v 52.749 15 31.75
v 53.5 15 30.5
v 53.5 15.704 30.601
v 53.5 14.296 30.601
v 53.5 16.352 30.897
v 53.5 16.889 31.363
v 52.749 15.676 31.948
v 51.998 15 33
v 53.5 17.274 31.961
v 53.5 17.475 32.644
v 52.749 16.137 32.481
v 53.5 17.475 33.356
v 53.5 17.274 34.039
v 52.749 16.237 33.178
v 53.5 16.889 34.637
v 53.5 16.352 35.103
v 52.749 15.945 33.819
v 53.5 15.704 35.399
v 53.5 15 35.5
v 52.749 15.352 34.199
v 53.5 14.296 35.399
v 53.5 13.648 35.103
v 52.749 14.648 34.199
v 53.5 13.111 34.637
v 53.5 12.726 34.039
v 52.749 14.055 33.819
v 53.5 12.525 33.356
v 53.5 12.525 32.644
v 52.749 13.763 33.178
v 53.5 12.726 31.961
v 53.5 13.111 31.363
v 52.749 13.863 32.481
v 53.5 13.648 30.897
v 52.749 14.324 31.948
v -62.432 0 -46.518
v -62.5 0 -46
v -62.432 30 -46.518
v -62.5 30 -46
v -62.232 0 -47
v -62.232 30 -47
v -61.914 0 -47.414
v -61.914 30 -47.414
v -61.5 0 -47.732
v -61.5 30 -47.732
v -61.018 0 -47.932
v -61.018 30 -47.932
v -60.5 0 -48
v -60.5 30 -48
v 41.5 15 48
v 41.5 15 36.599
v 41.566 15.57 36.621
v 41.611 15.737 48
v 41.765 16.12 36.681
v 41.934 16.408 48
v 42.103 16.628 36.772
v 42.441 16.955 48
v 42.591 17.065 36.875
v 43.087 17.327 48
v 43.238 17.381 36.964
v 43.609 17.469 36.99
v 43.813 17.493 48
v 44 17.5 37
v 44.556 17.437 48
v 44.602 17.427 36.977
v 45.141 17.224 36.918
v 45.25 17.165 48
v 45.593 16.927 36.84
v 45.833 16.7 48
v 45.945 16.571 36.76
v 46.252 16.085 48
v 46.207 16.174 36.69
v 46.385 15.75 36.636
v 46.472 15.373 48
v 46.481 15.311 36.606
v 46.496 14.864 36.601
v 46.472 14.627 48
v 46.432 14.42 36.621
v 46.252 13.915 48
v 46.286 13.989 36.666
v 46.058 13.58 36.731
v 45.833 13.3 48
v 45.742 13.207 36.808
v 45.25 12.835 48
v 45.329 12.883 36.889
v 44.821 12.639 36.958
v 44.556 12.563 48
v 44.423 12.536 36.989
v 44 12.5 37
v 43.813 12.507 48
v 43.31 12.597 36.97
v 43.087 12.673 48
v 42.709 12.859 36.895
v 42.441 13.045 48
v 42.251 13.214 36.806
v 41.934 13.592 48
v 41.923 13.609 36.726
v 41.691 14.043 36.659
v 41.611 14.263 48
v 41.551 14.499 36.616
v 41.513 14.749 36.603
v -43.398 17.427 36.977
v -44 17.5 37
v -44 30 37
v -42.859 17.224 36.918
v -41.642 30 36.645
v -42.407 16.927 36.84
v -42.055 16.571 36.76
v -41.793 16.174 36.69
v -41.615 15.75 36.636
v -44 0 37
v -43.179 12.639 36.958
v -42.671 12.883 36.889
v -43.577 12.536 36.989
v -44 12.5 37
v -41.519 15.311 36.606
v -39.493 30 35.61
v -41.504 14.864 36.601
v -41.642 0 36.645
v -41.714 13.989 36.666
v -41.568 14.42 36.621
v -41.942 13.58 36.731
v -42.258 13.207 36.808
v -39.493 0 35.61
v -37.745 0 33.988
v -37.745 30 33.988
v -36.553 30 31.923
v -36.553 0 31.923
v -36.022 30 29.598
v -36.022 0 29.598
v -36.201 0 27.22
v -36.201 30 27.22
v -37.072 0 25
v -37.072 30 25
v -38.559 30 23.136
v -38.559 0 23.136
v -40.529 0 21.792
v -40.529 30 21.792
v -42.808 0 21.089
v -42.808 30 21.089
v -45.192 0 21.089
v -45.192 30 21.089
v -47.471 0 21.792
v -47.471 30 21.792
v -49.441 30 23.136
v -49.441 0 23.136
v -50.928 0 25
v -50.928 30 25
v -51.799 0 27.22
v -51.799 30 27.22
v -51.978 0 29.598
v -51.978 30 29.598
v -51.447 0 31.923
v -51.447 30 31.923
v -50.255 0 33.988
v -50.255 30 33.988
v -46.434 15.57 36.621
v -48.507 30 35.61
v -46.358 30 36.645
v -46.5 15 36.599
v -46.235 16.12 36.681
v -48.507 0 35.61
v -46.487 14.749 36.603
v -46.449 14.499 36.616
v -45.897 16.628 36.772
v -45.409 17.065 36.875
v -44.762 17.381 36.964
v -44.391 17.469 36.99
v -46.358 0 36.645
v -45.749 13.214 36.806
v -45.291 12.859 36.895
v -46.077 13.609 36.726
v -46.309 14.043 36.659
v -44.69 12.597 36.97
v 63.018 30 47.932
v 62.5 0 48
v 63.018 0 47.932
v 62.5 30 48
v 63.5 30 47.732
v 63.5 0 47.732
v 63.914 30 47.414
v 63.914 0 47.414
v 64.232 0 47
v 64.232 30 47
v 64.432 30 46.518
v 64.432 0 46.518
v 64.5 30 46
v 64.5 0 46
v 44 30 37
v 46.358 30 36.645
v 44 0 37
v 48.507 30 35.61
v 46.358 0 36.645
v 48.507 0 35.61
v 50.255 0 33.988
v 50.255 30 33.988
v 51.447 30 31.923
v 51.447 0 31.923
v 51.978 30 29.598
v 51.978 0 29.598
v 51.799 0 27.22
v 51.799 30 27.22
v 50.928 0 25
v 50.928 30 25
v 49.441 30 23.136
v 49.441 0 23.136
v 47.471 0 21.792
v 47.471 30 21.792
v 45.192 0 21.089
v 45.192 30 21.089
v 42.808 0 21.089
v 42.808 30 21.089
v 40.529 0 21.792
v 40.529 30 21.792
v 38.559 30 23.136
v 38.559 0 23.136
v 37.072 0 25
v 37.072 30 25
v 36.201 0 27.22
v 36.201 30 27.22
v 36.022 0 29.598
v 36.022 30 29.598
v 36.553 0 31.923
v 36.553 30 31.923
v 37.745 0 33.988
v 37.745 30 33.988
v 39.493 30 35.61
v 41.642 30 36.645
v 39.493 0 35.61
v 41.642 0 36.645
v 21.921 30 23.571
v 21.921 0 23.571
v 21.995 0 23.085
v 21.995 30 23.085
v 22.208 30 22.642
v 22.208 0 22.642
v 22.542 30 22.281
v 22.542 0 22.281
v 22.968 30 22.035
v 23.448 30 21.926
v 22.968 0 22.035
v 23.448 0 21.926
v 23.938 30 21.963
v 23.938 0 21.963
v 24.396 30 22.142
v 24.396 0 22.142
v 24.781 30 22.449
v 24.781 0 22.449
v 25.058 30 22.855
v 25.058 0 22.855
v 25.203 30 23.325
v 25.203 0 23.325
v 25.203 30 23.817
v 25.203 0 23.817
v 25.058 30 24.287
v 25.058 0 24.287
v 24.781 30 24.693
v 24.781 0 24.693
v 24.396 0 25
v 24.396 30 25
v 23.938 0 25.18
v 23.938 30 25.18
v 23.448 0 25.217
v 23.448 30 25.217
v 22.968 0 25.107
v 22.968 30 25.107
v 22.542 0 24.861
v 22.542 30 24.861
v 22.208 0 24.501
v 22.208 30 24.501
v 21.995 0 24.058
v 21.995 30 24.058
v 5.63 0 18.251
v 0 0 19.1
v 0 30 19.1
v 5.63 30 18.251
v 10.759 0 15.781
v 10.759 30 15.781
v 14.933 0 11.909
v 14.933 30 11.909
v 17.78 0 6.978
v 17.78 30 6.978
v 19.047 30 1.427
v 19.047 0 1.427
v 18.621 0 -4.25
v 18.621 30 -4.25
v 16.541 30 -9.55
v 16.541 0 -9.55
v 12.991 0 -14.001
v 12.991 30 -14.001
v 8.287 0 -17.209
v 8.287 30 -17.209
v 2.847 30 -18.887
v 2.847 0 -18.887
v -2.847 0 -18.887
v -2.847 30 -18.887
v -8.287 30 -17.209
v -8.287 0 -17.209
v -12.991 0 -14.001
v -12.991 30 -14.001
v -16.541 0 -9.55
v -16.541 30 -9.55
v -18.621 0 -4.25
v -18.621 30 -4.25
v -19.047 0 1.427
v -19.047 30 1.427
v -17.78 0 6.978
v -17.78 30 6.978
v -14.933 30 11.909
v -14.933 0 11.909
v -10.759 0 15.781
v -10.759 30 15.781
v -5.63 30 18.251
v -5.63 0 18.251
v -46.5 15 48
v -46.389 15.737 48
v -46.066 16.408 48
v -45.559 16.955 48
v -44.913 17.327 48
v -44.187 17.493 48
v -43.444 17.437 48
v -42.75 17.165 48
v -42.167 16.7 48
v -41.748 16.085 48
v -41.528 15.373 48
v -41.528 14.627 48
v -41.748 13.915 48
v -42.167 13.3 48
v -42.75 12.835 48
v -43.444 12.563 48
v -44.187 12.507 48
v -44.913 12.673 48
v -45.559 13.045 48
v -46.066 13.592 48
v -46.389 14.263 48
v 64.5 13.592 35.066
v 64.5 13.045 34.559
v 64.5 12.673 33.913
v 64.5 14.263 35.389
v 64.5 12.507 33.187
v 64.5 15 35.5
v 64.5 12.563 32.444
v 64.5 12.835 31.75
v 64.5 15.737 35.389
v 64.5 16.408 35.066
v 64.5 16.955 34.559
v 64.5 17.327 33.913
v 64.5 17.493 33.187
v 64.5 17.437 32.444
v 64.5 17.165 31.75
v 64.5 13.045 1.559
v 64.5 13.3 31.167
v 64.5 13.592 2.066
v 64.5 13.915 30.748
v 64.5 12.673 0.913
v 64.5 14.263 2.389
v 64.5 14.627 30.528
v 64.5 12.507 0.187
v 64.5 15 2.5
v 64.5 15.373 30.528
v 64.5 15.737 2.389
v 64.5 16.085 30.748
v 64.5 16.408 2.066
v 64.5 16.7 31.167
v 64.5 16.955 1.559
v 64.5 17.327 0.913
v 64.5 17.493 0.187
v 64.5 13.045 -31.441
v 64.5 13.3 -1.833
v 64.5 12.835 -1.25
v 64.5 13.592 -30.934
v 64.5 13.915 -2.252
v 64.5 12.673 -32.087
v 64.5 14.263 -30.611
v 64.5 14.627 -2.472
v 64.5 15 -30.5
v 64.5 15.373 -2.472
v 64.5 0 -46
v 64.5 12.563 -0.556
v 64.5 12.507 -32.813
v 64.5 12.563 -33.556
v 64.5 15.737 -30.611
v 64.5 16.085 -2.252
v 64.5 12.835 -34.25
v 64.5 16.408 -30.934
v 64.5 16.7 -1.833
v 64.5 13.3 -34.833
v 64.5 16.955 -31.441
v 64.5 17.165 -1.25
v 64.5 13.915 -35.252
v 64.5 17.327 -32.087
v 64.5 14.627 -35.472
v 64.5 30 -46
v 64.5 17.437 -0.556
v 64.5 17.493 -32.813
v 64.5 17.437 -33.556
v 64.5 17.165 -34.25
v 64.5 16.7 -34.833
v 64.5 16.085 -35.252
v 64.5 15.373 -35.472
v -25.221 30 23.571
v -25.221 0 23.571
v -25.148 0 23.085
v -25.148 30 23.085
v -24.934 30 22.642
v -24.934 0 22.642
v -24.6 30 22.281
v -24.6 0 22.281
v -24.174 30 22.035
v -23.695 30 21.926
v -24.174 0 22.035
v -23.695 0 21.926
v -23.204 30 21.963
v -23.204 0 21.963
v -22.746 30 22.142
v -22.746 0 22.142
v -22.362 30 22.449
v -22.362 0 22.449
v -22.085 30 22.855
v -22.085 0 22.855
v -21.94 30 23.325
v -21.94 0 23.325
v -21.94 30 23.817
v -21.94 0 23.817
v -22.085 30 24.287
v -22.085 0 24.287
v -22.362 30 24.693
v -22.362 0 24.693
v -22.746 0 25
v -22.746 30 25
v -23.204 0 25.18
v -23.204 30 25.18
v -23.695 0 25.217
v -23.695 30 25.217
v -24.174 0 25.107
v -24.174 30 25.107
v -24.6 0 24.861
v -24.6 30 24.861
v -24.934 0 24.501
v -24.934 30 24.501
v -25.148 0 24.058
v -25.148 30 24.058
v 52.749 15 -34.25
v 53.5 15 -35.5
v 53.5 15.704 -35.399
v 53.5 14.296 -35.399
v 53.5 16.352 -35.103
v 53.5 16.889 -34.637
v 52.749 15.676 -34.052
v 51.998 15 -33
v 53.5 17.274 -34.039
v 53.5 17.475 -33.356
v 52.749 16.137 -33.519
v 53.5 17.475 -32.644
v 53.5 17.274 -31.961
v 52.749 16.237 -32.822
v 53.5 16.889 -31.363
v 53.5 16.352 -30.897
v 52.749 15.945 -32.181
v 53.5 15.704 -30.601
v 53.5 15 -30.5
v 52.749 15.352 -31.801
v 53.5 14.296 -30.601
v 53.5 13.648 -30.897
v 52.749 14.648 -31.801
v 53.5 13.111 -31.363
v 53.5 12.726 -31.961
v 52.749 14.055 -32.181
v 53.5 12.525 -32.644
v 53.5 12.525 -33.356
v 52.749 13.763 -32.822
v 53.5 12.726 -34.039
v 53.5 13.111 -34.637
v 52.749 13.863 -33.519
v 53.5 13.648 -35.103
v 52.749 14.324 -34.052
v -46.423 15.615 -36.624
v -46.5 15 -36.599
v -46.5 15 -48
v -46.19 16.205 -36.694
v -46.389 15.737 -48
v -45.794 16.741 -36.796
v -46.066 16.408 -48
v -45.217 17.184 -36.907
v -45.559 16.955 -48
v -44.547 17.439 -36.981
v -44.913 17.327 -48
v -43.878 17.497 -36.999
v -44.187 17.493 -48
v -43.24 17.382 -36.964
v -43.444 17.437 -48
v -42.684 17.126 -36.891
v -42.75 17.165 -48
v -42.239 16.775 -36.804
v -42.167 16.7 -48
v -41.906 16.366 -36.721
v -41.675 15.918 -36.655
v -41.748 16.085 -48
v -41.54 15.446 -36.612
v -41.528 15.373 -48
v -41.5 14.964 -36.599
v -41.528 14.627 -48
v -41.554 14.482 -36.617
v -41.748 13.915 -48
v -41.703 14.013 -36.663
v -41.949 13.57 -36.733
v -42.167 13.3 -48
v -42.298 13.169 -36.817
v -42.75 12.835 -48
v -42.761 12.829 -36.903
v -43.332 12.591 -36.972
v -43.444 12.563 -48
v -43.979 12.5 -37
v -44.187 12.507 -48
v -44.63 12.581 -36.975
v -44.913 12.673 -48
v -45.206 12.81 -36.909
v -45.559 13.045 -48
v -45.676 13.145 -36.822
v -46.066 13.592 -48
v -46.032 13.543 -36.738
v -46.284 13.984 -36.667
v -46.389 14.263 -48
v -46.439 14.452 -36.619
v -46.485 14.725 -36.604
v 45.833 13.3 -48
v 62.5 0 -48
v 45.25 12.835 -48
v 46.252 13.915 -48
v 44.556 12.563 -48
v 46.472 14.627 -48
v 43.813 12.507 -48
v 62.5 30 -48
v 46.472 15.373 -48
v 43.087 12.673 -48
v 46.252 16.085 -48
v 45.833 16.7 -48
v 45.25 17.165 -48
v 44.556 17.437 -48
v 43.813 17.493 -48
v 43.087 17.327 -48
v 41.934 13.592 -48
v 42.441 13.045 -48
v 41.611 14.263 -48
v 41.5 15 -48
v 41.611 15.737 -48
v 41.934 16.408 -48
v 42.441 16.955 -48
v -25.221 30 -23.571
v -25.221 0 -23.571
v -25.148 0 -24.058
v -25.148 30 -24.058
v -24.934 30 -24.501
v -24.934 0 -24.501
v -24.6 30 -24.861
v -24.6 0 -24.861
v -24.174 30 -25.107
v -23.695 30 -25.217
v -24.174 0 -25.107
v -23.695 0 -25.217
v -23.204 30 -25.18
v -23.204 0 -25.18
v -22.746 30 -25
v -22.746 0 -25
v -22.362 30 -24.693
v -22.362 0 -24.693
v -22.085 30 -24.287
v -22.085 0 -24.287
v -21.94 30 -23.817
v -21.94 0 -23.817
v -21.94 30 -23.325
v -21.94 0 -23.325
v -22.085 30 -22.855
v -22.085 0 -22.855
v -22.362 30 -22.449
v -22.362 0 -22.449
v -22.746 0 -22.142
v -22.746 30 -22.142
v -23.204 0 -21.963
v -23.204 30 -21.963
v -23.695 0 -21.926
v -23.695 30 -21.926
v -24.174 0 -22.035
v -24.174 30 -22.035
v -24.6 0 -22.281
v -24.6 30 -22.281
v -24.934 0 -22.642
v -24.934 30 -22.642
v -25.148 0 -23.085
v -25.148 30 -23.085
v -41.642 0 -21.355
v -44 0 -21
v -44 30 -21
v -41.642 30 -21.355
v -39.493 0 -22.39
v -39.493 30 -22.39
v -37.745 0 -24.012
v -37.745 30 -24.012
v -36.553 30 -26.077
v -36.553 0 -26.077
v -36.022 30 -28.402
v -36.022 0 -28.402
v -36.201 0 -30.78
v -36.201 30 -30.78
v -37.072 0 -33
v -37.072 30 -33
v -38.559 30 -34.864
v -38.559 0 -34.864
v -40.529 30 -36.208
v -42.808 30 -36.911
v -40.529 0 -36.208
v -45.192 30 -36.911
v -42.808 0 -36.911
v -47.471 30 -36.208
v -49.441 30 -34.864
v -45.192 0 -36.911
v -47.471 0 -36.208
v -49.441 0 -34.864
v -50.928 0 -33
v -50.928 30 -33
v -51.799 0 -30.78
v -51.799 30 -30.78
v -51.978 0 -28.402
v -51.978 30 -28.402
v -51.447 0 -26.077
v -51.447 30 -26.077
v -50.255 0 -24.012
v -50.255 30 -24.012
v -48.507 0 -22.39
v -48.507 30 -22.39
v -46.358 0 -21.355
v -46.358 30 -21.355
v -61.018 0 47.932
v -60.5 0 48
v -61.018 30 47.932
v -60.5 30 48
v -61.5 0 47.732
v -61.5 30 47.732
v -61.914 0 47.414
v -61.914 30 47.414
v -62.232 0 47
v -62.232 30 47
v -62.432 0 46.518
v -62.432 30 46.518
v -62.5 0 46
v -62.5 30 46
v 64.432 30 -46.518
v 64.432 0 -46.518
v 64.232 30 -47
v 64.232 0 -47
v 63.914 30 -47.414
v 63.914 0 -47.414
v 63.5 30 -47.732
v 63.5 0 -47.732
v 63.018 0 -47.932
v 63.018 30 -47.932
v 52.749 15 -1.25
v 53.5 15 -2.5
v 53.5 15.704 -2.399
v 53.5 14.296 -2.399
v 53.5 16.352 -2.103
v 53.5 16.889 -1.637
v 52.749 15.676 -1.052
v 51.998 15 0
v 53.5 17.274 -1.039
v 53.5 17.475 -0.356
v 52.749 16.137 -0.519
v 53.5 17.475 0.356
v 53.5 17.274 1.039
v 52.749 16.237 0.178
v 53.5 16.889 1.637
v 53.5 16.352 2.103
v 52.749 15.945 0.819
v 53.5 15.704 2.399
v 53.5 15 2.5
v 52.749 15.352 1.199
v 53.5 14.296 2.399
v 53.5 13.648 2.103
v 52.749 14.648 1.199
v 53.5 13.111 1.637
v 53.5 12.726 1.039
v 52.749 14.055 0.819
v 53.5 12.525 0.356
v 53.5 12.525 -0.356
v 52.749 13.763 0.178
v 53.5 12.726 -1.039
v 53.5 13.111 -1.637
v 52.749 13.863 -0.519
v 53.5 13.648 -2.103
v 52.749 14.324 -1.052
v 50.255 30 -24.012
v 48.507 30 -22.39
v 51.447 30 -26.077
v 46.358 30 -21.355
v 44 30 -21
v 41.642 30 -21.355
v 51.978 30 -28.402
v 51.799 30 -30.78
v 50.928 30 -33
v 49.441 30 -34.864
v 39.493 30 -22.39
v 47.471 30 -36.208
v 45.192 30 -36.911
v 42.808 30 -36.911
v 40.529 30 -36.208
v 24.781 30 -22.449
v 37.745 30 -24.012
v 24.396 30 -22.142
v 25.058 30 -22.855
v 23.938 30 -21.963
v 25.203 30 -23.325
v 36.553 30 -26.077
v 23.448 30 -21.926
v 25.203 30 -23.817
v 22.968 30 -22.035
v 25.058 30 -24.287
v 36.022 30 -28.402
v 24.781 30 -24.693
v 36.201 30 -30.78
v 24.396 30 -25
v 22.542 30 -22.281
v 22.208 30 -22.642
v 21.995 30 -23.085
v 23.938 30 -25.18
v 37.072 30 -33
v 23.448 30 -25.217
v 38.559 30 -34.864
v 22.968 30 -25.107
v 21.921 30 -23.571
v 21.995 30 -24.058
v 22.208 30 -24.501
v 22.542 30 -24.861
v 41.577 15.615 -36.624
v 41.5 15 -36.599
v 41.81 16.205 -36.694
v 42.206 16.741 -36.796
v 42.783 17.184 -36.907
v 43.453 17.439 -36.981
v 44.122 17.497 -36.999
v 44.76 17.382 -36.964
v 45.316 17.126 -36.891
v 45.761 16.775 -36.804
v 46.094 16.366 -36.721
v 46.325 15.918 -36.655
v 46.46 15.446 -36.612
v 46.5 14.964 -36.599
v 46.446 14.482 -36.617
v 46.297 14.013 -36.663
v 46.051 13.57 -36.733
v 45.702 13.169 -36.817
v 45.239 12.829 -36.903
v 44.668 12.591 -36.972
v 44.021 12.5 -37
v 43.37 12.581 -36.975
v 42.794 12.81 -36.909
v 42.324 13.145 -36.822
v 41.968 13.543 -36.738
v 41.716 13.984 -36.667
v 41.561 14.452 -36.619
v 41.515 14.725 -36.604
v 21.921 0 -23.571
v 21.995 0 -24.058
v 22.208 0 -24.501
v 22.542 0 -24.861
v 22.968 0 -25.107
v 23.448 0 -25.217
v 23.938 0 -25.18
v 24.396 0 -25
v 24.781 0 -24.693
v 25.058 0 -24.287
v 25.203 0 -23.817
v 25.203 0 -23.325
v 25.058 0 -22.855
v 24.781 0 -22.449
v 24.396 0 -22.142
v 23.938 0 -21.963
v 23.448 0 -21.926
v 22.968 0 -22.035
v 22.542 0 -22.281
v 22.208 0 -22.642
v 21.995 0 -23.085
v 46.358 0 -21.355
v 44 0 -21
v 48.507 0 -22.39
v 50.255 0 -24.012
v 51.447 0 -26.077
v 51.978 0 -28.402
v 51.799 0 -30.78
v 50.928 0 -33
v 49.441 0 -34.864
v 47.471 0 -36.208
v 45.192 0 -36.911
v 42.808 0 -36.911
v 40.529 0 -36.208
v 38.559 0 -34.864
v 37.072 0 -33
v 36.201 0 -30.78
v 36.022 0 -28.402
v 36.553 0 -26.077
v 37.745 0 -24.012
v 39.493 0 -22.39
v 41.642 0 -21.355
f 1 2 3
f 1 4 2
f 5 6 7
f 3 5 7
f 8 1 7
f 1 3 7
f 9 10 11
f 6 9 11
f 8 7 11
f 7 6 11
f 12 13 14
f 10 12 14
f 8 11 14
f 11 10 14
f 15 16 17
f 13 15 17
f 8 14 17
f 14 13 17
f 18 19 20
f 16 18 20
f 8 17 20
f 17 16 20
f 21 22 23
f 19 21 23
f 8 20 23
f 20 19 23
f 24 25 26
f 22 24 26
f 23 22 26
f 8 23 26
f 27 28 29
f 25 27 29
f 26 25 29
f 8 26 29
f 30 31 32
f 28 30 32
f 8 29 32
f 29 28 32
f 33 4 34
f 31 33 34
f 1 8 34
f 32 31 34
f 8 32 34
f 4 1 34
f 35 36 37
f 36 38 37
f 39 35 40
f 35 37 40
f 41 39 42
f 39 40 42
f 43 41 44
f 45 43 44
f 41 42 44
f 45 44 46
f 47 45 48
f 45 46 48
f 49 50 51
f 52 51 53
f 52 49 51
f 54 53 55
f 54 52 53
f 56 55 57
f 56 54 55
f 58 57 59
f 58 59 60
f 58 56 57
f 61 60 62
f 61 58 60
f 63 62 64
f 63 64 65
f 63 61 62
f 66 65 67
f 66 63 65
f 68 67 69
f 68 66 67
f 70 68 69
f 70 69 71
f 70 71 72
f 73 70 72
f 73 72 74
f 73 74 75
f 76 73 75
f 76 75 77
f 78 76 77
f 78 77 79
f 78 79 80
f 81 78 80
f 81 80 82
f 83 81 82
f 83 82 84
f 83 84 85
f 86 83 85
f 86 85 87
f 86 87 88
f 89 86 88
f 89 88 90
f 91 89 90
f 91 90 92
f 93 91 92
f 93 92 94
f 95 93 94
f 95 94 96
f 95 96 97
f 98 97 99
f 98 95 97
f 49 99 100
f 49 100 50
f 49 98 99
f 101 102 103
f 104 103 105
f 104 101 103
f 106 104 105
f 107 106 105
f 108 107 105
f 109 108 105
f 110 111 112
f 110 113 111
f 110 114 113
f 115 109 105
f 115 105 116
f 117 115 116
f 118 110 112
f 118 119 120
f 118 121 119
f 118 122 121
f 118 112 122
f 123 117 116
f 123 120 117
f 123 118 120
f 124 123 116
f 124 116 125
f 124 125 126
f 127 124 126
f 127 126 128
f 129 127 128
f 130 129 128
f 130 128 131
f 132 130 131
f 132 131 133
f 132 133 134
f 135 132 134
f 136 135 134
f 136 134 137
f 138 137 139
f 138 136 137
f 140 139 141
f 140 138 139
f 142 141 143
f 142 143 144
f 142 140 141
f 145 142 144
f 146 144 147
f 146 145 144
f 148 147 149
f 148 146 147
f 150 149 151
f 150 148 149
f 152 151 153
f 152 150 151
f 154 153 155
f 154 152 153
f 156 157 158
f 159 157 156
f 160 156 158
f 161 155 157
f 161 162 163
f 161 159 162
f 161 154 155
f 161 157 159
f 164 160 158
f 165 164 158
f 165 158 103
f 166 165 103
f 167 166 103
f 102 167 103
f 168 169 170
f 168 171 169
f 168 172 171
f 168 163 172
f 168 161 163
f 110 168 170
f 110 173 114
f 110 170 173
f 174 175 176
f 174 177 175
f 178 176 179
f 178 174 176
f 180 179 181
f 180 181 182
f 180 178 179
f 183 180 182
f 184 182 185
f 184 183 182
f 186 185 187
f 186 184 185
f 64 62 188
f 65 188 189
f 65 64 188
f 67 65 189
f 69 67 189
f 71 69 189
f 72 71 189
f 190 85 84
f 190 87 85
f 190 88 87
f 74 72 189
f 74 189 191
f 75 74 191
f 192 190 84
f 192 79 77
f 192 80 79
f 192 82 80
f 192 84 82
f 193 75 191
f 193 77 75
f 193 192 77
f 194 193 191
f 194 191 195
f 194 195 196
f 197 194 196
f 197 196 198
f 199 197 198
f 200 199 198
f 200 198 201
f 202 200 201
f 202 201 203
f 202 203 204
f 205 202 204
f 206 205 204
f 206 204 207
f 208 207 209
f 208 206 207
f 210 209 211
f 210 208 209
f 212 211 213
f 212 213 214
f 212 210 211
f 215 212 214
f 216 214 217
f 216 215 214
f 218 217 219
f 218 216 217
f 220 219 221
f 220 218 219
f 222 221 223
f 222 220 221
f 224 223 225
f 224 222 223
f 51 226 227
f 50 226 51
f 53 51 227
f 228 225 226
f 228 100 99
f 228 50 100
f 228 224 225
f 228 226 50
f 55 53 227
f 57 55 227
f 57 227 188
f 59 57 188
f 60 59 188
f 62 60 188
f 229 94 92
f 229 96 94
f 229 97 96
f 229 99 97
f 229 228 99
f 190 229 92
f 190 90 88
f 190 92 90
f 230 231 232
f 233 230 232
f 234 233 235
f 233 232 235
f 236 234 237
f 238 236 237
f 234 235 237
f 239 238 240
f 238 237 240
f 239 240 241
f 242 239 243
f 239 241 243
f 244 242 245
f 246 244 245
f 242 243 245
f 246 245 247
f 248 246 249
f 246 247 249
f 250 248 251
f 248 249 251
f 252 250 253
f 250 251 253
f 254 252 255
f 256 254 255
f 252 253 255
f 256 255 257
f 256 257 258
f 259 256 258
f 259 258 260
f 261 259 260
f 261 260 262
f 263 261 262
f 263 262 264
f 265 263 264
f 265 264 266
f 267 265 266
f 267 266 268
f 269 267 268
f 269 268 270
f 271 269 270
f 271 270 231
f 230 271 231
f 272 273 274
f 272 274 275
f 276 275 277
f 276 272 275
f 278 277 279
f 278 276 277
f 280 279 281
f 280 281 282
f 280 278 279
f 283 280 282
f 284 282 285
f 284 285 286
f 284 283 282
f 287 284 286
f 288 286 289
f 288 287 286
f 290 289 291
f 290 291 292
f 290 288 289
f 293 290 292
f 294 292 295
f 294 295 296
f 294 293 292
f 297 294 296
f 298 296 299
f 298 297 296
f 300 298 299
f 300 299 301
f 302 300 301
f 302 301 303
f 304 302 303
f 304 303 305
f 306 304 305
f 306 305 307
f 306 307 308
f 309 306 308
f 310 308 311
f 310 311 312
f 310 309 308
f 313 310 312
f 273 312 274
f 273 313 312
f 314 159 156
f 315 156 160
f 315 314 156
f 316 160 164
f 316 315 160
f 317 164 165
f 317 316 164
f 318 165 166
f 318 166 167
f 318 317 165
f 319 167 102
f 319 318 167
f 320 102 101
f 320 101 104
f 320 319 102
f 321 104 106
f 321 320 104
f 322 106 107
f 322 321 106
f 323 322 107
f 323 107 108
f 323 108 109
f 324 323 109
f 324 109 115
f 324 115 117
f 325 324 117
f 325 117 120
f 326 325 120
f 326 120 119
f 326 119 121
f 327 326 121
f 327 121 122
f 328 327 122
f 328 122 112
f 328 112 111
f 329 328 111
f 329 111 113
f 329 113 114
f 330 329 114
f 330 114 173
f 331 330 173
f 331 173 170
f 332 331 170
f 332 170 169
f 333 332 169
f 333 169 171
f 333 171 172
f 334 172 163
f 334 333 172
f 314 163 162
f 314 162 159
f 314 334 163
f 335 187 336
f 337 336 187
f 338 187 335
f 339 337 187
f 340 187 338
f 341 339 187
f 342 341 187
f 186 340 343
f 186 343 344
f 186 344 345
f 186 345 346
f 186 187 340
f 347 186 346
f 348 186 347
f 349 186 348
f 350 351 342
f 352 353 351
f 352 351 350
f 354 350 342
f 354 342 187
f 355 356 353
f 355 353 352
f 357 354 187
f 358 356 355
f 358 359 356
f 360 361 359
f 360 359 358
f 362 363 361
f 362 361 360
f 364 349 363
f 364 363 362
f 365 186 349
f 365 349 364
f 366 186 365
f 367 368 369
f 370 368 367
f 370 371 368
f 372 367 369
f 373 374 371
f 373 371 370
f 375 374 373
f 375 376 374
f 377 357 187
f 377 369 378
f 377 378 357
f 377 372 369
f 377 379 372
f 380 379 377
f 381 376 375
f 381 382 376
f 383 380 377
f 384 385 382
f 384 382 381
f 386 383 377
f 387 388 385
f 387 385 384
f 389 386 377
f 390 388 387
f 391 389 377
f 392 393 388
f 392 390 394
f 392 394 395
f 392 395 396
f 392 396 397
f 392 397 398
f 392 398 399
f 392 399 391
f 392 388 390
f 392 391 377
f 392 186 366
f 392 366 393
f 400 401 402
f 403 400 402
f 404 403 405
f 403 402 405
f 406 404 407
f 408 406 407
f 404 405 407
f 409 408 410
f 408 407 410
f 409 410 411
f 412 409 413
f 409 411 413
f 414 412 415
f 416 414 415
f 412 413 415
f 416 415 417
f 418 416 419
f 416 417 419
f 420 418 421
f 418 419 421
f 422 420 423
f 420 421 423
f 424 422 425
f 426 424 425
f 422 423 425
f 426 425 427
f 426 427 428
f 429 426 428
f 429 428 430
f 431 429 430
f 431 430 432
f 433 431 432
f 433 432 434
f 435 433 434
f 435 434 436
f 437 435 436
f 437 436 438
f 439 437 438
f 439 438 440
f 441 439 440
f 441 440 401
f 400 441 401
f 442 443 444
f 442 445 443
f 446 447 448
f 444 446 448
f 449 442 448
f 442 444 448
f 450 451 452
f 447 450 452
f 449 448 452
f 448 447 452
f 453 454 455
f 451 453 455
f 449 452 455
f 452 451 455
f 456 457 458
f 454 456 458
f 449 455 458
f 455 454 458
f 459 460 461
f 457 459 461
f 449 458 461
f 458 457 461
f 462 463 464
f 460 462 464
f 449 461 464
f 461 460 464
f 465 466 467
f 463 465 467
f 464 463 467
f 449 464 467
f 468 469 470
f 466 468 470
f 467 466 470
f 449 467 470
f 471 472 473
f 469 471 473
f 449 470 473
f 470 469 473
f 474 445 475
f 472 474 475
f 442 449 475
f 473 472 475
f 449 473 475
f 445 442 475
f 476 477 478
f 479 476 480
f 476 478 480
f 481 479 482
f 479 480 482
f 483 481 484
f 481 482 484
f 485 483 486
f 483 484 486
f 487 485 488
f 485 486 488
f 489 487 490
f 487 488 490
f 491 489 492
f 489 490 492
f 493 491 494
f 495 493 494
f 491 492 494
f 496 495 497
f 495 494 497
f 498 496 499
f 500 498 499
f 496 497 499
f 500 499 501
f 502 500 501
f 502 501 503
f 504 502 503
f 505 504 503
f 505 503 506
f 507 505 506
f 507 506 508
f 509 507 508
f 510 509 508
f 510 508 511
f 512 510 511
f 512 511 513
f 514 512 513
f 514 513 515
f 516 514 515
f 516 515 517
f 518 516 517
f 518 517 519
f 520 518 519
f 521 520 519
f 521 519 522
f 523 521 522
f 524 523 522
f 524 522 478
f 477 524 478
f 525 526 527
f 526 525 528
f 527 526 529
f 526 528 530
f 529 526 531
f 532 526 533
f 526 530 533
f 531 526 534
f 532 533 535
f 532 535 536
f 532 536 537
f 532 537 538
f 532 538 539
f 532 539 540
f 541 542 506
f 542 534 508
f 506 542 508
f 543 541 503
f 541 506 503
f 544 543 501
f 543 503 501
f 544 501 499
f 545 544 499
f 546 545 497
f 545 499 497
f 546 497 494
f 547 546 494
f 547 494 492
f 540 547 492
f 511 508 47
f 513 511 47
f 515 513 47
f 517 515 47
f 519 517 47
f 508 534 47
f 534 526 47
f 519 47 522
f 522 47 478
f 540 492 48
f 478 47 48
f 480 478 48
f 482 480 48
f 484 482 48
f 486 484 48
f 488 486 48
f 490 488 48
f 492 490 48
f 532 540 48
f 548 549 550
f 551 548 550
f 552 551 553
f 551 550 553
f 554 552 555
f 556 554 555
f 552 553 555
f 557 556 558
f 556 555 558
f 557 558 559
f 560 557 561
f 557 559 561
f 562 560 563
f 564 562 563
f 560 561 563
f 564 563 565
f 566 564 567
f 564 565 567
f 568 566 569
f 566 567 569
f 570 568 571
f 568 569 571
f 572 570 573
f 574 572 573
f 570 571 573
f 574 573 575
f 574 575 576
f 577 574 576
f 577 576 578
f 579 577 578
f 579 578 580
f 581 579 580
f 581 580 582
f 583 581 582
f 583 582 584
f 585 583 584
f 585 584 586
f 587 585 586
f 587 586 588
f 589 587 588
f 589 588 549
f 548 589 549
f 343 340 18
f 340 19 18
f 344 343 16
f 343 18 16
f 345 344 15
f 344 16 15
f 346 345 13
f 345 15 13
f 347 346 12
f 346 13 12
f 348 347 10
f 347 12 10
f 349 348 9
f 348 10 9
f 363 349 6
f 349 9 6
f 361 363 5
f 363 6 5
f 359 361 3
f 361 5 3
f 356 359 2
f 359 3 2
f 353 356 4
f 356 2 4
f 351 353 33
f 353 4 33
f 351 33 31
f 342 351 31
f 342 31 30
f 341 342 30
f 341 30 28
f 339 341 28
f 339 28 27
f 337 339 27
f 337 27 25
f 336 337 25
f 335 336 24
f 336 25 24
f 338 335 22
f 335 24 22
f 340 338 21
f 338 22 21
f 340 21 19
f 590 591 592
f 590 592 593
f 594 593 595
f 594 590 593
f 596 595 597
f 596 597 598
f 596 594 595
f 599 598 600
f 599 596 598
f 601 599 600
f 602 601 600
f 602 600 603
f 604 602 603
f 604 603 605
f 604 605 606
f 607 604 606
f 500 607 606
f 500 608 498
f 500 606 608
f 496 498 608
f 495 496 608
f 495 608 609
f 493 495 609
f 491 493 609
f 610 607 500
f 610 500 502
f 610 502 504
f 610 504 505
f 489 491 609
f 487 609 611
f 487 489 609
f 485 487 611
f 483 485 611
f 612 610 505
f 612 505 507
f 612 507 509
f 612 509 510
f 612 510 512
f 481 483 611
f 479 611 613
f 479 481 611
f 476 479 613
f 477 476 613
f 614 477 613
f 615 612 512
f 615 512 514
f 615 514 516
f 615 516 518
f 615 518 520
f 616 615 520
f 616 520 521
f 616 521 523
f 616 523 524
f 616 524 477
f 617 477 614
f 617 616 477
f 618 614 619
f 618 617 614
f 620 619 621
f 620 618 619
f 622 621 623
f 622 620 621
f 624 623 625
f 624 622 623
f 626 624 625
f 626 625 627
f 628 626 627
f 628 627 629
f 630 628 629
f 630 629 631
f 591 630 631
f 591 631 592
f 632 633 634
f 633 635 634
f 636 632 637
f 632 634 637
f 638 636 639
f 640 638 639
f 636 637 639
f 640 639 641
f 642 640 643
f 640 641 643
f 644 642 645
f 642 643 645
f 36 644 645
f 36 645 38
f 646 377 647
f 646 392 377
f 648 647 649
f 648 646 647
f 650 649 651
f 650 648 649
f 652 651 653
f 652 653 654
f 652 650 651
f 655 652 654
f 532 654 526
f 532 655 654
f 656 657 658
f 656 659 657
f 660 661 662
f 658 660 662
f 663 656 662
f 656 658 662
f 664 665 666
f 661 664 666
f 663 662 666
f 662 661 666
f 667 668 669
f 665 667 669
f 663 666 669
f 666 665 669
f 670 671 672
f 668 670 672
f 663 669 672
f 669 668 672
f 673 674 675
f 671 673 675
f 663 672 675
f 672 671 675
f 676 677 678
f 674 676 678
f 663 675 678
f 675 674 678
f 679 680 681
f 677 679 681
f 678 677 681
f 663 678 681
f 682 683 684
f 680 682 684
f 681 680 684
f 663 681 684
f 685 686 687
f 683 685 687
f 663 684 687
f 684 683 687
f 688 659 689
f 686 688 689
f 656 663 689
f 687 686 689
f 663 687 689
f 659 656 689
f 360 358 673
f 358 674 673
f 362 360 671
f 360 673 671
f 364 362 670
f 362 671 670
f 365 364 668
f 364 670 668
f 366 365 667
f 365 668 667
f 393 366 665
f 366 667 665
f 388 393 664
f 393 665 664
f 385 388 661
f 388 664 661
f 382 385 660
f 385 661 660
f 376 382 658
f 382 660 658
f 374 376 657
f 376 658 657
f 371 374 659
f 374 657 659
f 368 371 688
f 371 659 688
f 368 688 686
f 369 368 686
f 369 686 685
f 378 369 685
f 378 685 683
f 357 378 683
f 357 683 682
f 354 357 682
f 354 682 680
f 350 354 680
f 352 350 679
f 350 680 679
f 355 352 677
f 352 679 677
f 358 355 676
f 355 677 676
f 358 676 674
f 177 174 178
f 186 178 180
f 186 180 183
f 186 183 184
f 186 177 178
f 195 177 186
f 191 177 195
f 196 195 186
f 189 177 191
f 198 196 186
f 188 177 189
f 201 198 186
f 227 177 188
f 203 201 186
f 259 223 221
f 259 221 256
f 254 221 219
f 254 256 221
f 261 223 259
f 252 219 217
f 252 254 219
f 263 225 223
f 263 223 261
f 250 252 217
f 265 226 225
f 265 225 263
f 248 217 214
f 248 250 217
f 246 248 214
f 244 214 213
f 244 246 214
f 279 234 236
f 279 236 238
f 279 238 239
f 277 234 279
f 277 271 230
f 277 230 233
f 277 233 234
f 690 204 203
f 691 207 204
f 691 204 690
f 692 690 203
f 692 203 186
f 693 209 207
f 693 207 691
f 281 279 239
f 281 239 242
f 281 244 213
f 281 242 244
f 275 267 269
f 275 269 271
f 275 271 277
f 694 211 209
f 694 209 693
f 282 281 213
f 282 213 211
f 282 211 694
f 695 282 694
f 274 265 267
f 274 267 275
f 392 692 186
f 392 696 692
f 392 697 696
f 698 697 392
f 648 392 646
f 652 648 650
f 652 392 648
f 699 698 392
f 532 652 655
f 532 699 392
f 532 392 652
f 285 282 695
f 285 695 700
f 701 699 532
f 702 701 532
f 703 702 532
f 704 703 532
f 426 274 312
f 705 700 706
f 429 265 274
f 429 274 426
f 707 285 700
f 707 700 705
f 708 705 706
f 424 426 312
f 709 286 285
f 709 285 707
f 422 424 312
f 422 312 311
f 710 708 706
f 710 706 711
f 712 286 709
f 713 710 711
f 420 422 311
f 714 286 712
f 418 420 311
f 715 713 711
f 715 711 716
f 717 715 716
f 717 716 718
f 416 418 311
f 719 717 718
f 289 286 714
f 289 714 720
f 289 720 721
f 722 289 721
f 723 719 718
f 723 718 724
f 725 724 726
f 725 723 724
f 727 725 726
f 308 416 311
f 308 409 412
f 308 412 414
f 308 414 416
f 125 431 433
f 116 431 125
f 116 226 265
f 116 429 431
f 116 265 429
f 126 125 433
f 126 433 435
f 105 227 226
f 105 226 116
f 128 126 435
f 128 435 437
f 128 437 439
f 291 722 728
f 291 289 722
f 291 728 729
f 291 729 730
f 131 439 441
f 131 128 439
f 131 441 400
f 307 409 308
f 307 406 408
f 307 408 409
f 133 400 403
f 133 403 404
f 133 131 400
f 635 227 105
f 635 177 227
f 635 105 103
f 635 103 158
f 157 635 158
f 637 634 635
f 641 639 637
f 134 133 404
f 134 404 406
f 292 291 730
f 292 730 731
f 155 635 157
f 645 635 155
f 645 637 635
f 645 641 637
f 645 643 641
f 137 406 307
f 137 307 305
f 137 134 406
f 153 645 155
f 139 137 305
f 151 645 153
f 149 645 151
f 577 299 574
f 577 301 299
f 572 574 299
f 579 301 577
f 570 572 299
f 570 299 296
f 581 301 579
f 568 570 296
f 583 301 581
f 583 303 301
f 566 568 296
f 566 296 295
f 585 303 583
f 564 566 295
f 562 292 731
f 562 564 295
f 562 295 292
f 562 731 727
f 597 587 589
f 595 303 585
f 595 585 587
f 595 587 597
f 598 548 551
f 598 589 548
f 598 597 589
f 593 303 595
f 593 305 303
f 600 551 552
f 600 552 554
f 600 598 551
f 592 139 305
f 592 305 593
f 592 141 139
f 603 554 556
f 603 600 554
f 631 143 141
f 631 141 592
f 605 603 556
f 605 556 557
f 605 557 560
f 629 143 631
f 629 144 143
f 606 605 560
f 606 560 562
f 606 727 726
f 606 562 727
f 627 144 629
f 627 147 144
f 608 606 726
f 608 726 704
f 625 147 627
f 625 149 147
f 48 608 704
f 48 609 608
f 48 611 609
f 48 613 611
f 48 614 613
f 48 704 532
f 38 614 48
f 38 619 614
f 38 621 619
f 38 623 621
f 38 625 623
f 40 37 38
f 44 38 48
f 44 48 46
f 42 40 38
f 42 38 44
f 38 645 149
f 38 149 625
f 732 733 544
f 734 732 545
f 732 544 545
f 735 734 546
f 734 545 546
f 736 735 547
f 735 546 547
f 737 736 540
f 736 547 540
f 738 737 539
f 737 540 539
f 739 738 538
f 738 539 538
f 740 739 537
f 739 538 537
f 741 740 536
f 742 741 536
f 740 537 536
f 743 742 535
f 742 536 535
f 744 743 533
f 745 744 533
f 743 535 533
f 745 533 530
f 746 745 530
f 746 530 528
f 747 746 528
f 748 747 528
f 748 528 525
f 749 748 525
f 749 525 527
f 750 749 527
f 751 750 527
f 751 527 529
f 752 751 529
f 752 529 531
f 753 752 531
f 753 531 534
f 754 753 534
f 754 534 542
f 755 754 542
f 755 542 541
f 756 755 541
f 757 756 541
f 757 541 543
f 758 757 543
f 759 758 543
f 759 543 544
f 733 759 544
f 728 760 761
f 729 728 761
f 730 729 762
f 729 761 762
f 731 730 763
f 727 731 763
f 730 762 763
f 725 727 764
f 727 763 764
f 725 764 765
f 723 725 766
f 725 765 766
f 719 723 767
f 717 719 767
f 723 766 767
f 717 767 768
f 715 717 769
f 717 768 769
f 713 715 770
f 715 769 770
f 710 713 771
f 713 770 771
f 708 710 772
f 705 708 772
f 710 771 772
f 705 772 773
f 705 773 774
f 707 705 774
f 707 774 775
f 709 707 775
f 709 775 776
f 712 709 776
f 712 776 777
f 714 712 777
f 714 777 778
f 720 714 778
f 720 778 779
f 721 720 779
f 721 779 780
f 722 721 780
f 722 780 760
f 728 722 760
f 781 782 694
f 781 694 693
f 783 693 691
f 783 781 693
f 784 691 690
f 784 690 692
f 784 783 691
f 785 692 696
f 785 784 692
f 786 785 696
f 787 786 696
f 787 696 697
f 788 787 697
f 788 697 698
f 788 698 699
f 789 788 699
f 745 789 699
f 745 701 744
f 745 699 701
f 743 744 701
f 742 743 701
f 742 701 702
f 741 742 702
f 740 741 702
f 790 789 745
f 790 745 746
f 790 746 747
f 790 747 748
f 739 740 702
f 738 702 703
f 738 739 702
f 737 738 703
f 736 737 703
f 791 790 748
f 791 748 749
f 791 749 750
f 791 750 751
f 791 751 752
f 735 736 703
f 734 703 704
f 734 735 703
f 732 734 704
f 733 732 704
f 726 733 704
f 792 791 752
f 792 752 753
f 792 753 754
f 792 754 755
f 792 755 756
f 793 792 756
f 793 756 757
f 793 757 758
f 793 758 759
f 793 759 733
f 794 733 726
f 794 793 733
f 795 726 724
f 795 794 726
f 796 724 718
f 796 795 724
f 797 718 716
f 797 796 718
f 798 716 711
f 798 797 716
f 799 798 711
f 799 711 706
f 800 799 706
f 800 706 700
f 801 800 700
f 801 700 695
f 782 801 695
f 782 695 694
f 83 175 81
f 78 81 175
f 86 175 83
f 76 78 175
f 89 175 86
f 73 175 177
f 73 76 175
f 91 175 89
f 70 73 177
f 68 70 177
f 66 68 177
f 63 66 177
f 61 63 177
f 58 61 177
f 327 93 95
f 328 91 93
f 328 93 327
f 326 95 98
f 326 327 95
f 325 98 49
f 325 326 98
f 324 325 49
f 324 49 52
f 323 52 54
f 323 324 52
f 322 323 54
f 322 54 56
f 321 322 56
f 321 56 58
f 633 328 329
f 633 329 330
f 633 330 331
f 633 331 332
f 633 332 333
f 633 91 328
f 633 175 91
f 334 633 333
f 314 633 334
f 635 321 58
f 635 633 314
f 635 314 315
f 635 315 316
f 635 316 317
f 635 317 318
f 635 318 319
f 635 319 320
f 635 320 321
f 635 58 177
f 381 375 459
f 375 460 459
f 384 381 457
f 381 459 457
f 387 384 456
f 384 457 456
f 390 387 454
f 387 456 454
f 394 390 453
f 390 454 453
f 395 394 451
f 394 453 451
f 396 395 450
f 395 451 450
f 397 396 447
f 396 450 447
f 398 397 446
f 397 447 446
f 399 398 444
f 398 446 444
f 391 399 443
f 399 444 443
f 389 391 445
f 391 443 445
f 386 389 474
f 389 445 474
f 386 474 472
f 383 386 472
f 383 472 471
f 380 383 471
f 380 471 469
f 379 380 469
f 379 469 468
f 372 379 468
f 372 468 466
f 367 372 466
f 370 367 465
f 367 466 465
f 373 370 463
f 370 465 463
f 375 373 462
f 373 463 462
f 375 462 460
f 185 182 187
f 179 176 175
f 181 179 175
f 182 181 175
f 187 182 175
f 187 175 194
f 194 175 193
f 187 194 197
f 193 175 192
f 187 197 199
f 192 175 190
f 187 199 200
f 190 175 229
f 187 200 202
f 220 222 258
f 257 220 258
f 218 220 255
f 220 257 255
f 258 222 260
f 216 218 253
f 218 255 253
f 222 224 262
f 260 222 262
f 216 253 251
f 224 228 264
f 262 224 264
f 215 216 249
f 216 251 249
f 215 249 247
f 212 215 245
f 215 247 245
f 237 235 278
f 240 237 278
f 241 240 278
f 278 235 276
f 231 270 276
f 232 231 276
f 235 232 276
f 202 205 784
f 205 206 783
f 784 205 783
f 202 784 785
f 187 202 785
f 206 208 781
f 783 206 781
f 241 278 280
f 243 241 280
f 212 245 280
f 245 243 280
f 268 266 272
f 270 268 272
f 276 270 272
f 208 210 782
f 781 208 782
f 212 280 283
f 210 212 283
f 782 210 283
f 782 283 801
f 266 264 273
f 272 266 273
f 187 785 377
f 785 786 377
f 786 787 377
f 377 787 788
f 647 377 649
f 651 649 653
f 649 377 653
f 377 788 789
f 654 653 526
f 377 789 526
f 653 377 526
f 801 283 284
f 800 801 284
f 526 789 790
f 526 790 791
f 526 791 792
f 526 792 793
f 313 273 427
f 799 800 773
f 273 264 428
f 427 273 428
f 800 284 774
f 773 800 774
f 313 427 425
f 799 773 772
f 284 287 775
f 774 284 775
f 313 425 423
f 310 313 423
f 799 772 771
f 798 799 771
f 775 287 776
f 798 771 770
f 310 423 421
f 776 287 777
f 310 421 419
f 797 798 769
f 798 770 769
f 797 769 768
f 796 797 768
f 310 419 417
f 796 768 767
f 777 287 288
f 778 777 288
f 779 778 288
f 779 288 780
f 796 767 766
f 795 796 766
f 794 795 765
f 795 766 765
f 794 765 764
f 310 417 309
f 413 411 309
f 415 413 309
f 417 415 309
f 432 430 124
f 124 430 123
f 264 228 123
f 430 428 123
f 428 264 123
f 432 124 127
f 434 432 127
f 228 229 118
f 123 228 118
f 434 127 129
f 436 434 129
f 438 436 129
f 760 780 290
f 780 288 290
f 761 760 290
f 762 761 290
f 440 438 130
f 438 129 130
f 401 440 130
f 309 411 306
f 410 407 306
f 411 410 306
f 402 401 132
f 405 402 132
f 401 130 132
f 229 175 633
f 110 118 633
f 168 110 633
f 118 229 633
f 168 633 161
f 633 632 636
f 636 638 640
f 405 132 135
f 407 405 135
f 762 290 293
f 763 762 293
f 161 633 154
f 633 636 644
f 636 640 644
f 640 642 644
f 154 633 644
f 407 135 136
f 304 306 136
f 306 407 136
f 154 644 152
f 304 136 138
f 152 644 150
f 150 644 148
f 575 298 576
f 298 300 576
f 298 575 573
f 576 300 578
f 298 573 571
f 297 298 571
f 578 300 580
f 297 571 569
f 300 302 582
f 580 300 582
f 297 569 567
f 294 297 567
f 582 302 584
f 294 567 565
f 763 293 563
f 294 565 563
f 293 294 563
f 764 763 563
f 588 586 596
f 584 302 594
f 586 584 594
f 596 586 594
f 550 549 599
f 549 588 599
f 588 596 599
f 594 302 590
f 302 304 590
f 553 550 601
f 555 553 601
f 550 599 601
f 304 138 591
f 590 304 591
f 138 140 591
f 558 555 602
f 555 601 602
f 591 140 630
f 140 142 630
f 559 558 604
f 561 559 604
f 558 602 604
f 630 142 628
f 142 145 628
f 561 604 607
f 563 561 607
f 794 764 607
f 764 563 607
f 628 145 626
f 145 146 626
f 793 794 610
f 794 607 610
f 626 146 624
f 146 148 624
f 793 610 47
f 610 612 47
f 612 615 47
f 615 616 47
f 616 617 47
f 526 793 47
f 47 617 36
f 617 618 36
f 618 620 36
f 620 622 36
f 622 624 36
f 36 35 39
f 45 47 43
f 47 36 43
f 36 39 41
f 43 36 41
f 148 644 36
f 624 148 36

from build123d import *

# Parameters (mm, degrees)
SKETCH2_W                  = 125
SKETCH2_H                  = 96
SKETCH2_R                  = 8
SKETCH2_R_2                = 19.1
BOSS_EXTRUDE1_DEPTH        = 30
M4X0_7_TAPPED_HOLE1_D      = 3.3
SKETCH10_W                 = 96
SKETCH10_H                 = 30
BOSS_EXTRUDE3_DEPTH        = 2
M6X1_0_TAPPED_HOLE1_D      = 5
M6X1_0_TAPPED_HOLE1_DEPTH  = 11
M6X1_0_TAPPED_HOLE1_TIP    = 1.502151548
M6X1_0_TAPPED_HOLE3_REACH  = 121.483
M6X1_0_TAPPED_HOLE3_BORE_R = 2.5
FILLET1_R                  = 2


with BuildPart() as part:
    # Sketch2 → Boss-Extrude1 (new body)
    with BuildSketch(Plane(origin=(0, 0, 0), x_dir=(1, 0, 0), z_dir=(0, 1, 0))):
        Rectangle(SKETCH2_W, SKETCH2_H)
        with Locations(Location((-44, 29, 0), (0, 0, 270))):
            Circle(SKETCH2_R, mode=Mode.SUBTRACT)
        with Locations(Location((-44, -29, 0), (0, 0, 270))):
            Circle(SKETCH2_R, mode=Mode.SUBTRACT)
        with Locations(Location((44, -29, 0), (0, 0, 270))):
            Circle(SKETCH2_R, mode=Mode.SUBTRACT)
        with Locations(Location((44, 29, 0), (0, 0, 270))):
            Circle(SKETCH2_R, mode=Mode.SUBTRACT)
        with Locations(Location((0, 0, 0), (0, 0, 270))):
            Circle(SKETCH2_R_2, mode=Mode.SUBTRACT)
    extrude(amount=BOSS_EXTRUDE1_DEPTH)

    # M4x0.7 Tapped Hole1 (through all)
    with Locations(Plane(origin=(0, 30, 0), x_dir=(1, 0, 0), z_dir=(0, 1, 0))):
        with Locations((-23.5712, 23.5712), (23.5712, 23.5712), (23.5712, -23.5712), (-23.5712, -23.5712)):
            Hole(M4X0_7_TAPPED_HOLE1_D / 2)

    # Sketch10 → Boss-Extrude3 (add)
    with BuildSketch(Plane(origin=(62.5, 0, 0), x_dir=(0, 0, -1), z_dir=(1, 0, 0))):
        with Locations((0, 15)):
            Rectangle(SKETCH10_W, SKETCH10_H)
    extrude(amount=BOSS_EXTRUDE3_DEPTH)

    # M6x1.0 Tapped Hole1
    with Locations(Plane(origin=(64.5, 0, 0), x_dir=(0, 0, -1), z_dir=(1, 0, 0))):
        with Locations((-33, 15), (0, 15), (33, 15)):
            Hole(M6X1_0_TAPPED_HOLE1_D / 2, depth=M6X1_0_TAPPED_HOLE1_DEPTH)
            with Locations((0, 0, -(M6X1_0_TAPPED_HOLE1_DEPTH + M6X1_0_TAPPED_HOLE1_TIP / 2))):  # 118° drill point
                Cone(0, M6X1_0_TAPPED_HOLE1_D / 2, M6X1_0_TAPPED_HOLE1_TIP, mode=Mode.SUBTRACT)

    # M6x1.0 Tapped Hole3 bore → M6x1.0 Tapped Hole3 (cut, up to next)
    with BuildSketch(Plane(origin=(0, 0, -48), x_dir=(-1, 0, 0), z_dir=(0, 0, -1)), mode=Mode.PRIVATE) as m6x1_0_tapped_hole3_sk1:
        with Locations((-44, 15)):
            Circle(M6X1_0_TAPPED_HOLE3_BORE_R)
    m6x1_0_tapped_hole3_tool1 = extrude(m6x1_0_tapped_hole3_sk1.sketch, amount=-M6X1_0_TAPPED_HOLE3_REACH, mode=Mode.PRIVATE) & part.part
    # M6x1.0 Tapped Hole3 bore → M6x1.0 Tapped Hole3 (cut, up to next)
    with BuildSketch(Plane(origin=(0, 0, -48), x_dir=(-1, 0, 0), z_dir=(0, 0, -1)), mode=Mode.PRIVATE) as m6x1_0_tapped_hole3_sk2:
        with Locations((44, 15)):
            Circle(M6X1_0_TAPPED_HOLE3_BORE_R)
    m6x1_0_tapped_hole3_tool2 = extrude(m6x1_0_tapped_hole3_sk2.sketch, amount=-M6X1_0_TAPPED_HOLE3_REACH, mode=Mode.PRIVATE) & part.part
    m6x1_0_tapped_hole3_1 = m6x1_0_tapped_hole3_tool1.solids().sort_by_distance((44, 15, -48))[0]
    add(m6x1_0_tapped_hole3_1, mode=Mode.SUBTRACT)
    m6x1_0_tapped_hole3_2 = m6x1_0_tapped_hole3_tool2.solids().sort_by_distance((-44, 15, -48))[0]
    add(m6x1_0_tapped_hole3_2, mode=Mode.SUBTRACT)
    m6x1_0_tapped_hole3 = m6x1_0_tapped_hole3_1 + m6x1_0_tapped_hole3_2  # M6x1.0 Tapped Hole3 as one shape, for the pattern or mirror that repeats it

    # Fillet1
    fillet1_edges = [part.edges().sort_by_distance(p)[0] for p in [
        (64.5, 15, 48),
        (64.5, 15, -48),
        (-62.5, 15, -48),
        (-62.5, 15, 48),
    ]]
    fillet(fillet1_edges, radius=FILLET1_R)

    # Mirror1: M6x1.0 Tapped Hole3 across plane
    add(m6x1_0_tapped_hole3.mirror(Plane.XY), mode=Mode.SUBTRACT)


solid = part.part
